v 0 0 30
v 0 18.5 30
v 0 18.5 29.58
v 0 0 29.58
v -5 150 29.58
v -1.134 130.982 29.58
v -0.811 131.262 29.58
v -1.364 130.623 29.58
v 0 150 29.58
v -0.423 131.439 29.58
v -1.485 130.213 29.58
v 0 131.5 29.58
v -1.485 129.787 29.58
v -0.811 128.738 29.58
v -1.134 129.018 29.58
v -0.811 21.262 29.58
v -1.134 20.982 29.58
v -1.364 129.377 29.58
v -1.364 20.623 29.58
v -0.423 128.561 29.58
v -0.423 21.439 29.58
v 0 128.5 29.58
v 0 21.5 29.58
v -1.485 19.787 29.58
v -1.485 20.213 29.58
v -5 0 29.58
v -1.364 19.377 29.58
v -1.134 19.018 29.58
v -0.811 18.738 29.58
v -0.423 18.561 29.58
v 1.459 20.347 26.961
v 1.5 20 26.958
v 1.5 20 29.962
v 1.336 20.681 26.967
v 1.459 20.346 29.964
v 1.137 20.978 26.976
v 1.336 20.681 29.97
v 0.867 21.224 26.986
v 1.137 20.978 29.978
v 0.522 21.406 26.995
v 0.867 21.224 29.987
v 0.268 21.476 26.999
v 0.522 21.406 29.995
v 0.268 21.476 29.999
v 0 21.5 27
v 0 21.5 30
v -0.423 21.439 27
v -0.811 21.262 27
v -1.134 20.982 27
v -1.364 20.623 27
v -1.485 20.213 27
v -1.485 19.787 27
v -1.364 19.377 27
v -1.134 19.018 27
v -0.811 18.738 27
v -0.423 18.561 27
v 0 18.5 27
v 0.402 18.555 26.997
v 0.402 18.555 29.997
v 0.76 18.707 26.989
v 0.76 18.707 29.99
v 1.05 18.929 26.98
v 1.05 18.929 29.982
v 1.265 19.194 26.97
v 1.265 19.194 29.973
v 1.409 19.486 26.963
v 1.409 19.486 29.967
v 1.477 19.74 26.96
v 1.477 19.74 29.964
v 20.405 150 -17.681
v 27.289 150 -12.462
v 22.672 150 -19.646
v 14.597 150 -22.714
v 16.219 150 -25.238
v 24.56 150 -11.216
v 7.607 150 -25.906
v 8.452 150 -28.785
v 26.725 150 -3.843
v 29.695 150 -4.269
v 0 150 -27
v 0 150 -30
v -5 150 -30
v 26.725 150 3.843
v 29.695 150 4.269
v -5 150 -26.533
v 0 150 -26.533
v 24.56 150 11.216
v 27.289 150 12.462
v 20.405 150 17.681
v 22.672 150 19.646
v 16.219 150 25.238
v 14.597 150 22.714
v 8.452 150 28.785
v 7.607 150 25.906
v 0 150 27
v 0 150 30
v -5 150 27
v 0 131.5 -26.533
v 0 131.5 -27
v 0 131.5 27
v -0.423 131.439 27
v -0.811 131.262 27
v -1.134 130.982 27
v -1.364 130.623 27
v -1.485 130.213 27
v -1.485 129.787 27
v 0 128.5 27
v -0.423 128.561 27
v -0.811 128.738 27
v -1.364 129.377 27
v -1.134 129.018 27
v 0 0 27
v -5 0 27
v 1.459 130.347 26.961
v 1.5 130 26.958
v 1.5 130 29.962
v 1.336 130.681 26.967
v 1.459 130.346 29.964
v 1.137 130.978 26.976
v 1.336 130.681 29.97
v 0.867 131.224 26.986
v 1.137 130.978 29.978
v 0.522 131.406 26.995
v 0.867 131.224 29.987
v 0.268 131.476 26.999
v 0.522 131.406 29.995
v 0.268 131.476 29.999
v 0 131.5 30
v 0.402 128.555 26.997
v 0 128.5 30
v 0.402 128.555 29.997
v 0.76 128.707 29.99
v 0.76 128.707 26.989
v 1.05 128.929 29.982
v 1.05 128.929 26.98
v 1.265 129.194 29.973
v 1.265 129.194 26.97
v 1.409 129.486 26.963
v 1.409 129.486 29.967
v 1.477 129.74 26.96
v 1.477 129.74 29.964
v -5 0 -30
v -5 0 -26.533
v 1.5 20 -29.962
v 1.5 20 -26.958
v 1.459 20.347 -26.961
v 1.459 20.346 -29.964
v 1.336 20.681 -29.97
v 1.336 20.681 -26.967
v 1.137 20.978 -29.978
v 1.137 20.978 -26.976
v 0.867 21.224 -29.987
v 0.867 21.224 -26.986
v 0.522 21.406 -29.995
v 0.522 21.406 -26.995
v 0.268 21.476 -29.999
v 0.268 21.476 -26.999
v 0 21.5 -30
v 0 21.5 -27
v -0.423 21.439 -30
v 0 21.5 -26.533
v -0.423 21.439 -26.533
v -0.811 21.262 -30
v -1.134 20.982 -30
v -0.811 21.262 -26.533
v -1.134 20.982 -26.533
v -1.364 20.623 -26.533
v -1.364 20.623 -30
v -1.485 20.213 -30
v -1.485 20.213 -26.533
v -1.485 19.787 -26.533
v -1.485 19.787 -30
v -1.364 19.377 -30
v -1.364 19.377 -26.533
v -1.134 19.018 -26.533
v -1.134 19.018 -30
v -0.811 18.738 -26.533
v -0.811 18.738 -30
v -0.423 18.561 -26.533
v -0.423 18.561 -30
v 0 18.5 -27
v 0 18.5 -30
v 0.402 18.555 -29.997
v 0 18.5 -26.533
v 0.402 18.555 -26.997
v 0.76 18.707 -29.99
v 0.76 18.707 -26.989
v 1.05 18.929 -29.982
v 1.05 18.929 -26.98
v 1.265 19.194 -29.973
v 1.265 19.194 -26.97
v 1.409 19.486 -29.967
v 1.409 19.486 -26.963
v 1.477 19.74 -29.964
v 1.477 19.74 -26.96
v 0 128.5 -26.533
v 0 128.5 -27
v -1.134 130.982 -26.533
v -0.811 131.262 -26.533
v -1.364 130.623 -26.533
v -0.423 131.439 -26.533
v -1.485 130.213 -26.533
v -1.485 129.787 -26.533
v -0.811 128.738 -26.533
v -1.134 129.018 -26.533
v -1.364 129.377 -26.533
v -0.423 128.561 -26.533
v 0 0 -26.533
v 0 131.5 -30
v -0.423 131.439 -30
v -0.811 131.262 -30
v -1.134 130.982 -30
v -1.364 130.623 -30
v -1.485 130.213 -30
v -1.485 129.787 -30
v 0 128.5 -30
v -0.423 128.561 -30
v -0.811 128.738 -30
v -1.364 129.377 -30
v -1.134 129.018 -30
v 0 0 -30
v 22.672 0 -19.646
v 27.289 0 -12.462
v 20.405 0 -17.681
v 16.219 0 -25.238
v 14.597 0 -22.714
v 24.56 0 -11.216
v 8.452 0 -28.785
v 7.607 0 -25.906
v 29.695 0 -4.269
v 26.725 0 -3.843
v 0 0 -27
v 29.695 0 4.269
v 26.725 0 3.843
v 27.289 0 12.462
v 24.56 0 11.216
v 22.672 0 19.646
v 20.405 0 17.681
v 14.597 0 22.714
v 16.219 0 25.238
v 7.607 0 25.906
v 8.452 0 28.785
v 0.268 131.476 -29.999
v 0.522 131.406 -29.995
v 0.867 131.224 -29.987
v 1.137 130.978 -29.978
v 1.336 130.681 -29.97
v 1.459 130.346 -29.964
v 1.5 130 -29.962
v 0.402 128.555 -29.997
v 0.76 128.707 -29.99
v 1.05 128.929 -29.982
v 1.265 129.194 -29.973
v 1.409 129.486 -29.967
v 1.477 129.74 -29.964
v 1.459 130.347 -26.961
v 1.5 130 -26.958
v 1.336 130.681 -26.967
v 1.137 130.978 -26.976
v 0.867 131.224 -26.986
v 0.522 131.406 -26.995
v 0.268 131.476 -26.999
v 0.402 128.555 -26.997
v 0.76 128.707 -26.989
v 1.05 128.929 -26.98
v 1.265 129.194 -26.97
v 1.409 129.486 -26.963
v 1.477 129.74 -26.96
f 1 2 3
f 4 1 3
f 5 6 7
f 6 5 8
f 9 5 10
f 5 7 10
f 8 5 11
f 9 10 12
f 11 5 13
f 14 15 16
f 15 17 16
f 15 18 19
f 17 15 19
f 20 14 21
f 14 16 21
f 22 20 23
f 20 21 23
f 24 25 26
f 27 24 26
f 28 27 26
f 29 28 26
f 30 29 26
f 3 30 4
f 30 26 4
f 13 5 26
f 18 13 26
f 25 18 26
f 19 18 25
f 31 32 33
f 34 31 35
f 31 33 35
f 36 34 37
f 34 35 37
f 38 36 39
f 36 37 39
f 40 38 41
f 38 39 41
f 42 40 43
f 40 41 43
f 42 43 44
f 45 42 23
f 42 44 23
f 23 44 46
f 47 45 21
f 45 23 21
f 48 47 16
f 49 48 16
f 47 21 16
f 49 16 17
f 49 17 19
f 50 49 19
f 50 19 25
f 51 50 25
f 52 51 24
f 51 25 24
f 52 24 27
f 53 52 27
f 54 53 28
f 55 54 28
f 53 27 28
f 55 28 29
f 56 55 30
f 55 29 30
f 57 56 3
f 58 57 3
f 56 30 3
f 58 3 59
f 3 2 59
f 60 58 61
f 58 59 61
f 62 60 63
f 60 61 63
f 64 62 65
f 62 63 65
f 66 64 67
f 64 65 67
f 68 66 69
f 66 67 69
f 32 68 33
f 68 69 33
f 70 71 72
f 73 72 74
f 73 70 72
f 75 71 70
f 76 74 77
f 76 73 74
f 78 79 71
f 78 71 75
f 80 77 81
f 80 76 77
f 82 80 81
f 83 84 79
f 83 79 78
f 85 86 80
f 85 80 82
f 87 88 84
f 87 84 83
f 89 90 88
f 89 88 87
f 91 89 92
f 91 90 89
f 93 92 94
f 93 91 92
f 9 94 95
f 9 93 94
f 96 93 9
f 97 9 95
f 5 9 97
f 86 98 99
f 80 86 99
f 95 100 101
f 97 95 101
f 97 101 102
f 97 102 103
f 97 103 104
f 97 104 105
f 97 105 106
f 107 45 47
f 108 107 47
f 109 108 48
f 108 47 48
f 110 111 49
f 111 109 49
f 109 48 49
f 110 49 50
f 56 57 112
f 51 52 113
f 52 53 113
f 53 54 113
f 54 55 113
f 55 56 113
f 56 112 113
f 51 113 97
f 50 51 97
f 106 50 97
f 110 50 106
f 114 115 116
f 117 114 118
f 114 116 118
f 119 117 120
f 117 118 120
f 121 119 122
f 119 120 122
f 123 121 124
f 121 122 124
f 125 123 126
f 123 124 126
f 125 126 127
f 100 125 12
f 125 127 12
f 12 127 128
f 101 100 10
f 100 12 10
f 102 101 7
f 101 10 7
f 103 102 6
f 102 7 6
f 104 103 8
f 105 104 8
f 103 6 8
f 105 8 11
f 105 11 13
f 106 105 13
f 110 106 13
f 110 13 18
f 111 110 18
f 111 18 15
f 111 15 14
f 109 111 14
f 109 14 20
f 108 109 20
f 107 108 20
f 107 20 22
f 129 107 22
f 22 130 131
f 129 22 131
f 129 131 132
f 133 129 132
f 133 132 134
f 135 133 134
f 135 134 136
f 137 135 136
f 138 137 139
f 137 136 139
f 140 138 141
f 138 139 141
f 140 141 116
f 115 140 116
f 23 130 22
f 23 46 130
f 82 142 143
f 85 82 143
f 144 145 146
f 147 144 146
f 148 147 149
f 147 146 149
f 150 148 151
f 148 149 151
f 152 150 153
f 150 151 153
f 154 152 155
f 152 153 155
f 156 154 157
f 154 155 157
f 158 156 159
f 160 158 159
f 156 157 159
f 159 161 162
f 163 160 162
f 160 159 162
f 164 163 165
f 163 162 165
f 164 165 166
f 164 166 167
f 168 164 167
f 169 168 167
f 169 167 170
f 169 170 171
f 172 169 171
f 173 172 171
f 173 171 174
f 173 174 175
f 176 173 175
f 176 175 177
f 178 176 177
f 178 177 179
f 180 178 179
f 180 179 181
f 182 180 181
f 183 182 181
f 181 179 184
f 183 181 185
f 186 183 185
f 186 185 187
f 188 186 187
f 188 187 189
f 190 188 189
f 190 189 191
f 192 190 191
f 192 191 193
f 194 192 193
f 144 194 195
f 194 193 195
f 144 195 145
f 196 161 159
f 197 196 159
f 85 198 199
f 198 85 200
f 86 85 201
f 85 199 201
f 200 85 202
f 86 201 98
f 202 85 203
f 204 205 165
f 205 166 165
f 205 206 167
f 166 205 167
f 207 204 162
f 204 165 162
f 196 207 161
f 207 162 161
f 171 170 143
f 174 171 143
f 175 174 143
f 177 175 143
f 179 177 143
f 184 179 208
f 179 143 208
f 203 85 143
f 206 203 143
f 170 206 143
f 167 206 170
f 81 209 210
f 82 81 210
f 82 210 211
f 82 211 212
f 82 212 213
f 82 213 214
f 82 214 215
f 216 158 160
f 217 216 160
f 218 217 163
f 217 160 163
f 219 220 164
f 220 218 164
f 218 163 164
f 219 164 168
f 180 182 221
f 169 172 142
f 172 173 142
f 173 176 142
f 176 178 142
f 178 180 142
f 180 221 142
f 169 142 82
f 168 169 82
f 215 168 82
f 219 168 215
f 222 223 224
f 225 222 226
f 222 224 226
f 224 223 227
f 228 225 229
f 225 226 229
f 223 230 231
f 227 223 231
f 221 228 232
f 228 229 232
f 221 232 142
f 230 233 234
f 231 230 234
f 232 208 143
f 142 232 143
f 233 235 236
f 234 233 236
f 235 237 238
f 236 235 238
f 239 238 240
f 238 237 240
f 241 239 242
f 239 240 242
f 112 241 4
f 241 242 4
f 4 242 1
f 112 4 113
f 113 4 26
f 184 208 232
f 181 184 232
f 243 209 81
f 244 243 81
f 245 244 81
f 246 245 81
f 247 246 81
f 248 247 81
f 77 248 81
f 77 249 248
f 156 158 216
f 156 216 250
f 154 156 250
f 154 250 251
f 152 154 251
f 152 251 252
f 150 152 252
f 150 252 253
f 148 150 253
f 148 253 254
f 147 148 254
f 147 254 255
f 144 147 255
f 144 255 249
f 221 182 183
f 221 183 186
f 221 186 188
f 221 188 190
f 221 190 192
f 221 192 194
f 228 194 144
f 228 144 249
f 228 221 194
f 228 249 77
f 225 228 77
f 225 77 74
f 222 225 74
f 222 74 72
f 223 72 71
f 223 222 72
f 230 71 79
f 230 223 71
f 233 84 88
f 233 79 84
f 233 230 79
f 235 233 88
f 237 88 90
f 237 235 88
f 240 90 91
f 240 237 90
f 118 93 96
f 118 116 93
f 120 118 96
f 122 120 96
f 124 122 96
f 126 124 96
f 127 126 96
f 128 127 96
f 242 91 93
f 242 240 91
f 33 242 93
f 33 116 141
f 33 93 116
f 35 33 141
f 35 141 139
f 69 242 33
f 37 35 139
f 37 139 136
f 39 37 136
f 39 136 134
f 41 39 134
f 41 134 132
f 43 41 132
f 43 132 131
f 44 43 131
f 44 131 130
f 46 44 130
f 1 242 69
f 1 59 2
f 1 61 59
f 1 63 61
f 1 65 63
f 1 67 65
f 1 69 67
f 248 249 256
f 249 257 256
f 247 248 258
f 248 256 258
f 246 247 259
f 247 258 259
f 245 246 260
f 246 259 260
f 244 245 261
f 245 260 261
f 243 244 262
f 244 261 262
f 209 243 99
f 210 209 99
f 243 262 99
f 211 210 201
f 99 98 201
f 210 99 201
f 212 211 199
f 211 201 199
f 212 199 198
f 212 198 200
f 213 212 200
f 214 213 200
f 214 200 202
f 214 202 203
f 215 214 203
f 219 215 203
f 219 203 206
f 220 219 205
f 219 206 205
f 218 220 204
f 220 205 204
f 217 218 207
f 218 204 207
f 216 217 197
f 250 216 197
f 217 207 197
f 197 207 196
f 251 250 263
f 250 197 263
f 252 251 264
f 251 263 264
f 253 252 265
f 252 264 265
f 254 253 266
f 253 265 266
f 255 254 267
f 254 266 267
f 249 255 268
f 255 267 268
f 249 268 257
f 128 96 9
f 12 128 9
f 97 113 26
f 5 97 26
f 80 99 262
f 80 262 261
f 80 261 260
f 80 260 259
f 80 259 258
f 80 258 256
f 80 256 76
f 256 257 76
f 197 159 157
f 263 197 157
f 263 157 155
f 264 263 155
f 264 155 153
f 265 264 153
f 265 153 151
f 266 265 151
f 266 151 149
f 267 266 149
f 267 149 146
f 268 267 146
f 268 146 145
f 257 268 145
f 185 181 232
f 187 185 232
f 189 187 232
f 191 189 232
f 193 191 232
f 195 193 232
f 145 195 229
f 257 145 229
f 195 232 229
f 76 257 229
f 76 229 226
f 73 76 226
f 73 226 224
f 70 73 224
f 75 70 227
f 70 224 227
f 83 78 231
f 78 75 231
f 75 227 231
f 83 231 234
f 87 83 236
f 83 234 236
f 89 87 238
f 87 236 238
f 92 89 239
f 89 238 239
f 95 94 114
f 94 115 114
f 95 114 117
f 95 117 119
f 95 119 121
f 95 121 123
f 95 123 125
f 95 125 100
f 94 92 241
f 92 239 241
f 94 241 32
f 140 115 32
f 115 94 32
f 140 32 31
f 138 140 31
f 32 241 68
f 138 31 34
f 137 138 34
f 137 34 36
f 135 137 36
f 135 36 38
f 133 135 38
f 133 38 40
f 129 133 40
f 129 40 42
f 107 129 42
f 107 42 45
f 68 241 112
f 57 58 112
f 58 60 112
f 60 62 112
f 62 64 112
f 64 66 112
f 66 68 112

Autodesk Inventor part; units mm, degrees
ref_plane "YZ Plane" through (0, 0, 0) normal (1, 0, 0) x (0, 1, 0)
sketch "Sketch1" plane through (0, 0, 0) normal (0, 1, 0) x (-1, 0, 0)
  arc A0 (0, 27) -> (0, -27) centre (0, 0) ccw
  arc A1 (0, 30) -> (0, -30) centre (0, 0) ccw
  line L0 (0, 30) -> (0, 27)
  line L1 (0, -27) -> (0, -30)
  line L2 (0, -30) -> (5, -30)
  line L3 (5, -30) -> (5, -26.533)
  line L4 (5, -26.533) -> (0, -26.533)
  line L5 (0, -26.533) -> (0, -30)
  line L6 (0, 27) -> (5, 27)
  line L7 (5, 27) -> (5, 29.5804)
  line L8 (5, 29.5804) -> (0, 29.5804)
  line L9 (0, 29.5804) -> (0, 27)
  dimension "d0" = 30
  dimension "d1" = 27
  dimension "d31" = 5
  dimension "d32" = 5
extrude "Extrusion1" add sketch "Sketch1" along normal blind 150
ref_plane "Work Plane2" through (0, 0, 30) normal (0, 0, 1) x (1, 0, 0)
sketch "Sketch3" plane through (0, 0, 30) normal (0, 0, 1) x (1, 0, 0)
  circle A0 centre (0, 20) radius 1.5
  circle A1 centre (0, 130) radius 1.5
  line L0 (0, 0) -> (30, 0) projected
  line L1 (0, 0) -> (0, 150) projected
  line L2 (30, 150) -> (0, 150) projected
  line L3 (-5, 0) -> (-5, 150) projected
  dimension "d14" = 3
  dimension "d15" = 20
  dimension "d17" = 3
  dimension "d18" = 20
  dimension "d33" = 5
  dimension "d34" = 5
extrude "Extrusion3" cut sketch "Sketch3" against normal through all
ref_plane "Work Plane3" through (0, 0, -30) normal (0, 0, 1) x (1, 0, 0)
properties part number "goulotte"
